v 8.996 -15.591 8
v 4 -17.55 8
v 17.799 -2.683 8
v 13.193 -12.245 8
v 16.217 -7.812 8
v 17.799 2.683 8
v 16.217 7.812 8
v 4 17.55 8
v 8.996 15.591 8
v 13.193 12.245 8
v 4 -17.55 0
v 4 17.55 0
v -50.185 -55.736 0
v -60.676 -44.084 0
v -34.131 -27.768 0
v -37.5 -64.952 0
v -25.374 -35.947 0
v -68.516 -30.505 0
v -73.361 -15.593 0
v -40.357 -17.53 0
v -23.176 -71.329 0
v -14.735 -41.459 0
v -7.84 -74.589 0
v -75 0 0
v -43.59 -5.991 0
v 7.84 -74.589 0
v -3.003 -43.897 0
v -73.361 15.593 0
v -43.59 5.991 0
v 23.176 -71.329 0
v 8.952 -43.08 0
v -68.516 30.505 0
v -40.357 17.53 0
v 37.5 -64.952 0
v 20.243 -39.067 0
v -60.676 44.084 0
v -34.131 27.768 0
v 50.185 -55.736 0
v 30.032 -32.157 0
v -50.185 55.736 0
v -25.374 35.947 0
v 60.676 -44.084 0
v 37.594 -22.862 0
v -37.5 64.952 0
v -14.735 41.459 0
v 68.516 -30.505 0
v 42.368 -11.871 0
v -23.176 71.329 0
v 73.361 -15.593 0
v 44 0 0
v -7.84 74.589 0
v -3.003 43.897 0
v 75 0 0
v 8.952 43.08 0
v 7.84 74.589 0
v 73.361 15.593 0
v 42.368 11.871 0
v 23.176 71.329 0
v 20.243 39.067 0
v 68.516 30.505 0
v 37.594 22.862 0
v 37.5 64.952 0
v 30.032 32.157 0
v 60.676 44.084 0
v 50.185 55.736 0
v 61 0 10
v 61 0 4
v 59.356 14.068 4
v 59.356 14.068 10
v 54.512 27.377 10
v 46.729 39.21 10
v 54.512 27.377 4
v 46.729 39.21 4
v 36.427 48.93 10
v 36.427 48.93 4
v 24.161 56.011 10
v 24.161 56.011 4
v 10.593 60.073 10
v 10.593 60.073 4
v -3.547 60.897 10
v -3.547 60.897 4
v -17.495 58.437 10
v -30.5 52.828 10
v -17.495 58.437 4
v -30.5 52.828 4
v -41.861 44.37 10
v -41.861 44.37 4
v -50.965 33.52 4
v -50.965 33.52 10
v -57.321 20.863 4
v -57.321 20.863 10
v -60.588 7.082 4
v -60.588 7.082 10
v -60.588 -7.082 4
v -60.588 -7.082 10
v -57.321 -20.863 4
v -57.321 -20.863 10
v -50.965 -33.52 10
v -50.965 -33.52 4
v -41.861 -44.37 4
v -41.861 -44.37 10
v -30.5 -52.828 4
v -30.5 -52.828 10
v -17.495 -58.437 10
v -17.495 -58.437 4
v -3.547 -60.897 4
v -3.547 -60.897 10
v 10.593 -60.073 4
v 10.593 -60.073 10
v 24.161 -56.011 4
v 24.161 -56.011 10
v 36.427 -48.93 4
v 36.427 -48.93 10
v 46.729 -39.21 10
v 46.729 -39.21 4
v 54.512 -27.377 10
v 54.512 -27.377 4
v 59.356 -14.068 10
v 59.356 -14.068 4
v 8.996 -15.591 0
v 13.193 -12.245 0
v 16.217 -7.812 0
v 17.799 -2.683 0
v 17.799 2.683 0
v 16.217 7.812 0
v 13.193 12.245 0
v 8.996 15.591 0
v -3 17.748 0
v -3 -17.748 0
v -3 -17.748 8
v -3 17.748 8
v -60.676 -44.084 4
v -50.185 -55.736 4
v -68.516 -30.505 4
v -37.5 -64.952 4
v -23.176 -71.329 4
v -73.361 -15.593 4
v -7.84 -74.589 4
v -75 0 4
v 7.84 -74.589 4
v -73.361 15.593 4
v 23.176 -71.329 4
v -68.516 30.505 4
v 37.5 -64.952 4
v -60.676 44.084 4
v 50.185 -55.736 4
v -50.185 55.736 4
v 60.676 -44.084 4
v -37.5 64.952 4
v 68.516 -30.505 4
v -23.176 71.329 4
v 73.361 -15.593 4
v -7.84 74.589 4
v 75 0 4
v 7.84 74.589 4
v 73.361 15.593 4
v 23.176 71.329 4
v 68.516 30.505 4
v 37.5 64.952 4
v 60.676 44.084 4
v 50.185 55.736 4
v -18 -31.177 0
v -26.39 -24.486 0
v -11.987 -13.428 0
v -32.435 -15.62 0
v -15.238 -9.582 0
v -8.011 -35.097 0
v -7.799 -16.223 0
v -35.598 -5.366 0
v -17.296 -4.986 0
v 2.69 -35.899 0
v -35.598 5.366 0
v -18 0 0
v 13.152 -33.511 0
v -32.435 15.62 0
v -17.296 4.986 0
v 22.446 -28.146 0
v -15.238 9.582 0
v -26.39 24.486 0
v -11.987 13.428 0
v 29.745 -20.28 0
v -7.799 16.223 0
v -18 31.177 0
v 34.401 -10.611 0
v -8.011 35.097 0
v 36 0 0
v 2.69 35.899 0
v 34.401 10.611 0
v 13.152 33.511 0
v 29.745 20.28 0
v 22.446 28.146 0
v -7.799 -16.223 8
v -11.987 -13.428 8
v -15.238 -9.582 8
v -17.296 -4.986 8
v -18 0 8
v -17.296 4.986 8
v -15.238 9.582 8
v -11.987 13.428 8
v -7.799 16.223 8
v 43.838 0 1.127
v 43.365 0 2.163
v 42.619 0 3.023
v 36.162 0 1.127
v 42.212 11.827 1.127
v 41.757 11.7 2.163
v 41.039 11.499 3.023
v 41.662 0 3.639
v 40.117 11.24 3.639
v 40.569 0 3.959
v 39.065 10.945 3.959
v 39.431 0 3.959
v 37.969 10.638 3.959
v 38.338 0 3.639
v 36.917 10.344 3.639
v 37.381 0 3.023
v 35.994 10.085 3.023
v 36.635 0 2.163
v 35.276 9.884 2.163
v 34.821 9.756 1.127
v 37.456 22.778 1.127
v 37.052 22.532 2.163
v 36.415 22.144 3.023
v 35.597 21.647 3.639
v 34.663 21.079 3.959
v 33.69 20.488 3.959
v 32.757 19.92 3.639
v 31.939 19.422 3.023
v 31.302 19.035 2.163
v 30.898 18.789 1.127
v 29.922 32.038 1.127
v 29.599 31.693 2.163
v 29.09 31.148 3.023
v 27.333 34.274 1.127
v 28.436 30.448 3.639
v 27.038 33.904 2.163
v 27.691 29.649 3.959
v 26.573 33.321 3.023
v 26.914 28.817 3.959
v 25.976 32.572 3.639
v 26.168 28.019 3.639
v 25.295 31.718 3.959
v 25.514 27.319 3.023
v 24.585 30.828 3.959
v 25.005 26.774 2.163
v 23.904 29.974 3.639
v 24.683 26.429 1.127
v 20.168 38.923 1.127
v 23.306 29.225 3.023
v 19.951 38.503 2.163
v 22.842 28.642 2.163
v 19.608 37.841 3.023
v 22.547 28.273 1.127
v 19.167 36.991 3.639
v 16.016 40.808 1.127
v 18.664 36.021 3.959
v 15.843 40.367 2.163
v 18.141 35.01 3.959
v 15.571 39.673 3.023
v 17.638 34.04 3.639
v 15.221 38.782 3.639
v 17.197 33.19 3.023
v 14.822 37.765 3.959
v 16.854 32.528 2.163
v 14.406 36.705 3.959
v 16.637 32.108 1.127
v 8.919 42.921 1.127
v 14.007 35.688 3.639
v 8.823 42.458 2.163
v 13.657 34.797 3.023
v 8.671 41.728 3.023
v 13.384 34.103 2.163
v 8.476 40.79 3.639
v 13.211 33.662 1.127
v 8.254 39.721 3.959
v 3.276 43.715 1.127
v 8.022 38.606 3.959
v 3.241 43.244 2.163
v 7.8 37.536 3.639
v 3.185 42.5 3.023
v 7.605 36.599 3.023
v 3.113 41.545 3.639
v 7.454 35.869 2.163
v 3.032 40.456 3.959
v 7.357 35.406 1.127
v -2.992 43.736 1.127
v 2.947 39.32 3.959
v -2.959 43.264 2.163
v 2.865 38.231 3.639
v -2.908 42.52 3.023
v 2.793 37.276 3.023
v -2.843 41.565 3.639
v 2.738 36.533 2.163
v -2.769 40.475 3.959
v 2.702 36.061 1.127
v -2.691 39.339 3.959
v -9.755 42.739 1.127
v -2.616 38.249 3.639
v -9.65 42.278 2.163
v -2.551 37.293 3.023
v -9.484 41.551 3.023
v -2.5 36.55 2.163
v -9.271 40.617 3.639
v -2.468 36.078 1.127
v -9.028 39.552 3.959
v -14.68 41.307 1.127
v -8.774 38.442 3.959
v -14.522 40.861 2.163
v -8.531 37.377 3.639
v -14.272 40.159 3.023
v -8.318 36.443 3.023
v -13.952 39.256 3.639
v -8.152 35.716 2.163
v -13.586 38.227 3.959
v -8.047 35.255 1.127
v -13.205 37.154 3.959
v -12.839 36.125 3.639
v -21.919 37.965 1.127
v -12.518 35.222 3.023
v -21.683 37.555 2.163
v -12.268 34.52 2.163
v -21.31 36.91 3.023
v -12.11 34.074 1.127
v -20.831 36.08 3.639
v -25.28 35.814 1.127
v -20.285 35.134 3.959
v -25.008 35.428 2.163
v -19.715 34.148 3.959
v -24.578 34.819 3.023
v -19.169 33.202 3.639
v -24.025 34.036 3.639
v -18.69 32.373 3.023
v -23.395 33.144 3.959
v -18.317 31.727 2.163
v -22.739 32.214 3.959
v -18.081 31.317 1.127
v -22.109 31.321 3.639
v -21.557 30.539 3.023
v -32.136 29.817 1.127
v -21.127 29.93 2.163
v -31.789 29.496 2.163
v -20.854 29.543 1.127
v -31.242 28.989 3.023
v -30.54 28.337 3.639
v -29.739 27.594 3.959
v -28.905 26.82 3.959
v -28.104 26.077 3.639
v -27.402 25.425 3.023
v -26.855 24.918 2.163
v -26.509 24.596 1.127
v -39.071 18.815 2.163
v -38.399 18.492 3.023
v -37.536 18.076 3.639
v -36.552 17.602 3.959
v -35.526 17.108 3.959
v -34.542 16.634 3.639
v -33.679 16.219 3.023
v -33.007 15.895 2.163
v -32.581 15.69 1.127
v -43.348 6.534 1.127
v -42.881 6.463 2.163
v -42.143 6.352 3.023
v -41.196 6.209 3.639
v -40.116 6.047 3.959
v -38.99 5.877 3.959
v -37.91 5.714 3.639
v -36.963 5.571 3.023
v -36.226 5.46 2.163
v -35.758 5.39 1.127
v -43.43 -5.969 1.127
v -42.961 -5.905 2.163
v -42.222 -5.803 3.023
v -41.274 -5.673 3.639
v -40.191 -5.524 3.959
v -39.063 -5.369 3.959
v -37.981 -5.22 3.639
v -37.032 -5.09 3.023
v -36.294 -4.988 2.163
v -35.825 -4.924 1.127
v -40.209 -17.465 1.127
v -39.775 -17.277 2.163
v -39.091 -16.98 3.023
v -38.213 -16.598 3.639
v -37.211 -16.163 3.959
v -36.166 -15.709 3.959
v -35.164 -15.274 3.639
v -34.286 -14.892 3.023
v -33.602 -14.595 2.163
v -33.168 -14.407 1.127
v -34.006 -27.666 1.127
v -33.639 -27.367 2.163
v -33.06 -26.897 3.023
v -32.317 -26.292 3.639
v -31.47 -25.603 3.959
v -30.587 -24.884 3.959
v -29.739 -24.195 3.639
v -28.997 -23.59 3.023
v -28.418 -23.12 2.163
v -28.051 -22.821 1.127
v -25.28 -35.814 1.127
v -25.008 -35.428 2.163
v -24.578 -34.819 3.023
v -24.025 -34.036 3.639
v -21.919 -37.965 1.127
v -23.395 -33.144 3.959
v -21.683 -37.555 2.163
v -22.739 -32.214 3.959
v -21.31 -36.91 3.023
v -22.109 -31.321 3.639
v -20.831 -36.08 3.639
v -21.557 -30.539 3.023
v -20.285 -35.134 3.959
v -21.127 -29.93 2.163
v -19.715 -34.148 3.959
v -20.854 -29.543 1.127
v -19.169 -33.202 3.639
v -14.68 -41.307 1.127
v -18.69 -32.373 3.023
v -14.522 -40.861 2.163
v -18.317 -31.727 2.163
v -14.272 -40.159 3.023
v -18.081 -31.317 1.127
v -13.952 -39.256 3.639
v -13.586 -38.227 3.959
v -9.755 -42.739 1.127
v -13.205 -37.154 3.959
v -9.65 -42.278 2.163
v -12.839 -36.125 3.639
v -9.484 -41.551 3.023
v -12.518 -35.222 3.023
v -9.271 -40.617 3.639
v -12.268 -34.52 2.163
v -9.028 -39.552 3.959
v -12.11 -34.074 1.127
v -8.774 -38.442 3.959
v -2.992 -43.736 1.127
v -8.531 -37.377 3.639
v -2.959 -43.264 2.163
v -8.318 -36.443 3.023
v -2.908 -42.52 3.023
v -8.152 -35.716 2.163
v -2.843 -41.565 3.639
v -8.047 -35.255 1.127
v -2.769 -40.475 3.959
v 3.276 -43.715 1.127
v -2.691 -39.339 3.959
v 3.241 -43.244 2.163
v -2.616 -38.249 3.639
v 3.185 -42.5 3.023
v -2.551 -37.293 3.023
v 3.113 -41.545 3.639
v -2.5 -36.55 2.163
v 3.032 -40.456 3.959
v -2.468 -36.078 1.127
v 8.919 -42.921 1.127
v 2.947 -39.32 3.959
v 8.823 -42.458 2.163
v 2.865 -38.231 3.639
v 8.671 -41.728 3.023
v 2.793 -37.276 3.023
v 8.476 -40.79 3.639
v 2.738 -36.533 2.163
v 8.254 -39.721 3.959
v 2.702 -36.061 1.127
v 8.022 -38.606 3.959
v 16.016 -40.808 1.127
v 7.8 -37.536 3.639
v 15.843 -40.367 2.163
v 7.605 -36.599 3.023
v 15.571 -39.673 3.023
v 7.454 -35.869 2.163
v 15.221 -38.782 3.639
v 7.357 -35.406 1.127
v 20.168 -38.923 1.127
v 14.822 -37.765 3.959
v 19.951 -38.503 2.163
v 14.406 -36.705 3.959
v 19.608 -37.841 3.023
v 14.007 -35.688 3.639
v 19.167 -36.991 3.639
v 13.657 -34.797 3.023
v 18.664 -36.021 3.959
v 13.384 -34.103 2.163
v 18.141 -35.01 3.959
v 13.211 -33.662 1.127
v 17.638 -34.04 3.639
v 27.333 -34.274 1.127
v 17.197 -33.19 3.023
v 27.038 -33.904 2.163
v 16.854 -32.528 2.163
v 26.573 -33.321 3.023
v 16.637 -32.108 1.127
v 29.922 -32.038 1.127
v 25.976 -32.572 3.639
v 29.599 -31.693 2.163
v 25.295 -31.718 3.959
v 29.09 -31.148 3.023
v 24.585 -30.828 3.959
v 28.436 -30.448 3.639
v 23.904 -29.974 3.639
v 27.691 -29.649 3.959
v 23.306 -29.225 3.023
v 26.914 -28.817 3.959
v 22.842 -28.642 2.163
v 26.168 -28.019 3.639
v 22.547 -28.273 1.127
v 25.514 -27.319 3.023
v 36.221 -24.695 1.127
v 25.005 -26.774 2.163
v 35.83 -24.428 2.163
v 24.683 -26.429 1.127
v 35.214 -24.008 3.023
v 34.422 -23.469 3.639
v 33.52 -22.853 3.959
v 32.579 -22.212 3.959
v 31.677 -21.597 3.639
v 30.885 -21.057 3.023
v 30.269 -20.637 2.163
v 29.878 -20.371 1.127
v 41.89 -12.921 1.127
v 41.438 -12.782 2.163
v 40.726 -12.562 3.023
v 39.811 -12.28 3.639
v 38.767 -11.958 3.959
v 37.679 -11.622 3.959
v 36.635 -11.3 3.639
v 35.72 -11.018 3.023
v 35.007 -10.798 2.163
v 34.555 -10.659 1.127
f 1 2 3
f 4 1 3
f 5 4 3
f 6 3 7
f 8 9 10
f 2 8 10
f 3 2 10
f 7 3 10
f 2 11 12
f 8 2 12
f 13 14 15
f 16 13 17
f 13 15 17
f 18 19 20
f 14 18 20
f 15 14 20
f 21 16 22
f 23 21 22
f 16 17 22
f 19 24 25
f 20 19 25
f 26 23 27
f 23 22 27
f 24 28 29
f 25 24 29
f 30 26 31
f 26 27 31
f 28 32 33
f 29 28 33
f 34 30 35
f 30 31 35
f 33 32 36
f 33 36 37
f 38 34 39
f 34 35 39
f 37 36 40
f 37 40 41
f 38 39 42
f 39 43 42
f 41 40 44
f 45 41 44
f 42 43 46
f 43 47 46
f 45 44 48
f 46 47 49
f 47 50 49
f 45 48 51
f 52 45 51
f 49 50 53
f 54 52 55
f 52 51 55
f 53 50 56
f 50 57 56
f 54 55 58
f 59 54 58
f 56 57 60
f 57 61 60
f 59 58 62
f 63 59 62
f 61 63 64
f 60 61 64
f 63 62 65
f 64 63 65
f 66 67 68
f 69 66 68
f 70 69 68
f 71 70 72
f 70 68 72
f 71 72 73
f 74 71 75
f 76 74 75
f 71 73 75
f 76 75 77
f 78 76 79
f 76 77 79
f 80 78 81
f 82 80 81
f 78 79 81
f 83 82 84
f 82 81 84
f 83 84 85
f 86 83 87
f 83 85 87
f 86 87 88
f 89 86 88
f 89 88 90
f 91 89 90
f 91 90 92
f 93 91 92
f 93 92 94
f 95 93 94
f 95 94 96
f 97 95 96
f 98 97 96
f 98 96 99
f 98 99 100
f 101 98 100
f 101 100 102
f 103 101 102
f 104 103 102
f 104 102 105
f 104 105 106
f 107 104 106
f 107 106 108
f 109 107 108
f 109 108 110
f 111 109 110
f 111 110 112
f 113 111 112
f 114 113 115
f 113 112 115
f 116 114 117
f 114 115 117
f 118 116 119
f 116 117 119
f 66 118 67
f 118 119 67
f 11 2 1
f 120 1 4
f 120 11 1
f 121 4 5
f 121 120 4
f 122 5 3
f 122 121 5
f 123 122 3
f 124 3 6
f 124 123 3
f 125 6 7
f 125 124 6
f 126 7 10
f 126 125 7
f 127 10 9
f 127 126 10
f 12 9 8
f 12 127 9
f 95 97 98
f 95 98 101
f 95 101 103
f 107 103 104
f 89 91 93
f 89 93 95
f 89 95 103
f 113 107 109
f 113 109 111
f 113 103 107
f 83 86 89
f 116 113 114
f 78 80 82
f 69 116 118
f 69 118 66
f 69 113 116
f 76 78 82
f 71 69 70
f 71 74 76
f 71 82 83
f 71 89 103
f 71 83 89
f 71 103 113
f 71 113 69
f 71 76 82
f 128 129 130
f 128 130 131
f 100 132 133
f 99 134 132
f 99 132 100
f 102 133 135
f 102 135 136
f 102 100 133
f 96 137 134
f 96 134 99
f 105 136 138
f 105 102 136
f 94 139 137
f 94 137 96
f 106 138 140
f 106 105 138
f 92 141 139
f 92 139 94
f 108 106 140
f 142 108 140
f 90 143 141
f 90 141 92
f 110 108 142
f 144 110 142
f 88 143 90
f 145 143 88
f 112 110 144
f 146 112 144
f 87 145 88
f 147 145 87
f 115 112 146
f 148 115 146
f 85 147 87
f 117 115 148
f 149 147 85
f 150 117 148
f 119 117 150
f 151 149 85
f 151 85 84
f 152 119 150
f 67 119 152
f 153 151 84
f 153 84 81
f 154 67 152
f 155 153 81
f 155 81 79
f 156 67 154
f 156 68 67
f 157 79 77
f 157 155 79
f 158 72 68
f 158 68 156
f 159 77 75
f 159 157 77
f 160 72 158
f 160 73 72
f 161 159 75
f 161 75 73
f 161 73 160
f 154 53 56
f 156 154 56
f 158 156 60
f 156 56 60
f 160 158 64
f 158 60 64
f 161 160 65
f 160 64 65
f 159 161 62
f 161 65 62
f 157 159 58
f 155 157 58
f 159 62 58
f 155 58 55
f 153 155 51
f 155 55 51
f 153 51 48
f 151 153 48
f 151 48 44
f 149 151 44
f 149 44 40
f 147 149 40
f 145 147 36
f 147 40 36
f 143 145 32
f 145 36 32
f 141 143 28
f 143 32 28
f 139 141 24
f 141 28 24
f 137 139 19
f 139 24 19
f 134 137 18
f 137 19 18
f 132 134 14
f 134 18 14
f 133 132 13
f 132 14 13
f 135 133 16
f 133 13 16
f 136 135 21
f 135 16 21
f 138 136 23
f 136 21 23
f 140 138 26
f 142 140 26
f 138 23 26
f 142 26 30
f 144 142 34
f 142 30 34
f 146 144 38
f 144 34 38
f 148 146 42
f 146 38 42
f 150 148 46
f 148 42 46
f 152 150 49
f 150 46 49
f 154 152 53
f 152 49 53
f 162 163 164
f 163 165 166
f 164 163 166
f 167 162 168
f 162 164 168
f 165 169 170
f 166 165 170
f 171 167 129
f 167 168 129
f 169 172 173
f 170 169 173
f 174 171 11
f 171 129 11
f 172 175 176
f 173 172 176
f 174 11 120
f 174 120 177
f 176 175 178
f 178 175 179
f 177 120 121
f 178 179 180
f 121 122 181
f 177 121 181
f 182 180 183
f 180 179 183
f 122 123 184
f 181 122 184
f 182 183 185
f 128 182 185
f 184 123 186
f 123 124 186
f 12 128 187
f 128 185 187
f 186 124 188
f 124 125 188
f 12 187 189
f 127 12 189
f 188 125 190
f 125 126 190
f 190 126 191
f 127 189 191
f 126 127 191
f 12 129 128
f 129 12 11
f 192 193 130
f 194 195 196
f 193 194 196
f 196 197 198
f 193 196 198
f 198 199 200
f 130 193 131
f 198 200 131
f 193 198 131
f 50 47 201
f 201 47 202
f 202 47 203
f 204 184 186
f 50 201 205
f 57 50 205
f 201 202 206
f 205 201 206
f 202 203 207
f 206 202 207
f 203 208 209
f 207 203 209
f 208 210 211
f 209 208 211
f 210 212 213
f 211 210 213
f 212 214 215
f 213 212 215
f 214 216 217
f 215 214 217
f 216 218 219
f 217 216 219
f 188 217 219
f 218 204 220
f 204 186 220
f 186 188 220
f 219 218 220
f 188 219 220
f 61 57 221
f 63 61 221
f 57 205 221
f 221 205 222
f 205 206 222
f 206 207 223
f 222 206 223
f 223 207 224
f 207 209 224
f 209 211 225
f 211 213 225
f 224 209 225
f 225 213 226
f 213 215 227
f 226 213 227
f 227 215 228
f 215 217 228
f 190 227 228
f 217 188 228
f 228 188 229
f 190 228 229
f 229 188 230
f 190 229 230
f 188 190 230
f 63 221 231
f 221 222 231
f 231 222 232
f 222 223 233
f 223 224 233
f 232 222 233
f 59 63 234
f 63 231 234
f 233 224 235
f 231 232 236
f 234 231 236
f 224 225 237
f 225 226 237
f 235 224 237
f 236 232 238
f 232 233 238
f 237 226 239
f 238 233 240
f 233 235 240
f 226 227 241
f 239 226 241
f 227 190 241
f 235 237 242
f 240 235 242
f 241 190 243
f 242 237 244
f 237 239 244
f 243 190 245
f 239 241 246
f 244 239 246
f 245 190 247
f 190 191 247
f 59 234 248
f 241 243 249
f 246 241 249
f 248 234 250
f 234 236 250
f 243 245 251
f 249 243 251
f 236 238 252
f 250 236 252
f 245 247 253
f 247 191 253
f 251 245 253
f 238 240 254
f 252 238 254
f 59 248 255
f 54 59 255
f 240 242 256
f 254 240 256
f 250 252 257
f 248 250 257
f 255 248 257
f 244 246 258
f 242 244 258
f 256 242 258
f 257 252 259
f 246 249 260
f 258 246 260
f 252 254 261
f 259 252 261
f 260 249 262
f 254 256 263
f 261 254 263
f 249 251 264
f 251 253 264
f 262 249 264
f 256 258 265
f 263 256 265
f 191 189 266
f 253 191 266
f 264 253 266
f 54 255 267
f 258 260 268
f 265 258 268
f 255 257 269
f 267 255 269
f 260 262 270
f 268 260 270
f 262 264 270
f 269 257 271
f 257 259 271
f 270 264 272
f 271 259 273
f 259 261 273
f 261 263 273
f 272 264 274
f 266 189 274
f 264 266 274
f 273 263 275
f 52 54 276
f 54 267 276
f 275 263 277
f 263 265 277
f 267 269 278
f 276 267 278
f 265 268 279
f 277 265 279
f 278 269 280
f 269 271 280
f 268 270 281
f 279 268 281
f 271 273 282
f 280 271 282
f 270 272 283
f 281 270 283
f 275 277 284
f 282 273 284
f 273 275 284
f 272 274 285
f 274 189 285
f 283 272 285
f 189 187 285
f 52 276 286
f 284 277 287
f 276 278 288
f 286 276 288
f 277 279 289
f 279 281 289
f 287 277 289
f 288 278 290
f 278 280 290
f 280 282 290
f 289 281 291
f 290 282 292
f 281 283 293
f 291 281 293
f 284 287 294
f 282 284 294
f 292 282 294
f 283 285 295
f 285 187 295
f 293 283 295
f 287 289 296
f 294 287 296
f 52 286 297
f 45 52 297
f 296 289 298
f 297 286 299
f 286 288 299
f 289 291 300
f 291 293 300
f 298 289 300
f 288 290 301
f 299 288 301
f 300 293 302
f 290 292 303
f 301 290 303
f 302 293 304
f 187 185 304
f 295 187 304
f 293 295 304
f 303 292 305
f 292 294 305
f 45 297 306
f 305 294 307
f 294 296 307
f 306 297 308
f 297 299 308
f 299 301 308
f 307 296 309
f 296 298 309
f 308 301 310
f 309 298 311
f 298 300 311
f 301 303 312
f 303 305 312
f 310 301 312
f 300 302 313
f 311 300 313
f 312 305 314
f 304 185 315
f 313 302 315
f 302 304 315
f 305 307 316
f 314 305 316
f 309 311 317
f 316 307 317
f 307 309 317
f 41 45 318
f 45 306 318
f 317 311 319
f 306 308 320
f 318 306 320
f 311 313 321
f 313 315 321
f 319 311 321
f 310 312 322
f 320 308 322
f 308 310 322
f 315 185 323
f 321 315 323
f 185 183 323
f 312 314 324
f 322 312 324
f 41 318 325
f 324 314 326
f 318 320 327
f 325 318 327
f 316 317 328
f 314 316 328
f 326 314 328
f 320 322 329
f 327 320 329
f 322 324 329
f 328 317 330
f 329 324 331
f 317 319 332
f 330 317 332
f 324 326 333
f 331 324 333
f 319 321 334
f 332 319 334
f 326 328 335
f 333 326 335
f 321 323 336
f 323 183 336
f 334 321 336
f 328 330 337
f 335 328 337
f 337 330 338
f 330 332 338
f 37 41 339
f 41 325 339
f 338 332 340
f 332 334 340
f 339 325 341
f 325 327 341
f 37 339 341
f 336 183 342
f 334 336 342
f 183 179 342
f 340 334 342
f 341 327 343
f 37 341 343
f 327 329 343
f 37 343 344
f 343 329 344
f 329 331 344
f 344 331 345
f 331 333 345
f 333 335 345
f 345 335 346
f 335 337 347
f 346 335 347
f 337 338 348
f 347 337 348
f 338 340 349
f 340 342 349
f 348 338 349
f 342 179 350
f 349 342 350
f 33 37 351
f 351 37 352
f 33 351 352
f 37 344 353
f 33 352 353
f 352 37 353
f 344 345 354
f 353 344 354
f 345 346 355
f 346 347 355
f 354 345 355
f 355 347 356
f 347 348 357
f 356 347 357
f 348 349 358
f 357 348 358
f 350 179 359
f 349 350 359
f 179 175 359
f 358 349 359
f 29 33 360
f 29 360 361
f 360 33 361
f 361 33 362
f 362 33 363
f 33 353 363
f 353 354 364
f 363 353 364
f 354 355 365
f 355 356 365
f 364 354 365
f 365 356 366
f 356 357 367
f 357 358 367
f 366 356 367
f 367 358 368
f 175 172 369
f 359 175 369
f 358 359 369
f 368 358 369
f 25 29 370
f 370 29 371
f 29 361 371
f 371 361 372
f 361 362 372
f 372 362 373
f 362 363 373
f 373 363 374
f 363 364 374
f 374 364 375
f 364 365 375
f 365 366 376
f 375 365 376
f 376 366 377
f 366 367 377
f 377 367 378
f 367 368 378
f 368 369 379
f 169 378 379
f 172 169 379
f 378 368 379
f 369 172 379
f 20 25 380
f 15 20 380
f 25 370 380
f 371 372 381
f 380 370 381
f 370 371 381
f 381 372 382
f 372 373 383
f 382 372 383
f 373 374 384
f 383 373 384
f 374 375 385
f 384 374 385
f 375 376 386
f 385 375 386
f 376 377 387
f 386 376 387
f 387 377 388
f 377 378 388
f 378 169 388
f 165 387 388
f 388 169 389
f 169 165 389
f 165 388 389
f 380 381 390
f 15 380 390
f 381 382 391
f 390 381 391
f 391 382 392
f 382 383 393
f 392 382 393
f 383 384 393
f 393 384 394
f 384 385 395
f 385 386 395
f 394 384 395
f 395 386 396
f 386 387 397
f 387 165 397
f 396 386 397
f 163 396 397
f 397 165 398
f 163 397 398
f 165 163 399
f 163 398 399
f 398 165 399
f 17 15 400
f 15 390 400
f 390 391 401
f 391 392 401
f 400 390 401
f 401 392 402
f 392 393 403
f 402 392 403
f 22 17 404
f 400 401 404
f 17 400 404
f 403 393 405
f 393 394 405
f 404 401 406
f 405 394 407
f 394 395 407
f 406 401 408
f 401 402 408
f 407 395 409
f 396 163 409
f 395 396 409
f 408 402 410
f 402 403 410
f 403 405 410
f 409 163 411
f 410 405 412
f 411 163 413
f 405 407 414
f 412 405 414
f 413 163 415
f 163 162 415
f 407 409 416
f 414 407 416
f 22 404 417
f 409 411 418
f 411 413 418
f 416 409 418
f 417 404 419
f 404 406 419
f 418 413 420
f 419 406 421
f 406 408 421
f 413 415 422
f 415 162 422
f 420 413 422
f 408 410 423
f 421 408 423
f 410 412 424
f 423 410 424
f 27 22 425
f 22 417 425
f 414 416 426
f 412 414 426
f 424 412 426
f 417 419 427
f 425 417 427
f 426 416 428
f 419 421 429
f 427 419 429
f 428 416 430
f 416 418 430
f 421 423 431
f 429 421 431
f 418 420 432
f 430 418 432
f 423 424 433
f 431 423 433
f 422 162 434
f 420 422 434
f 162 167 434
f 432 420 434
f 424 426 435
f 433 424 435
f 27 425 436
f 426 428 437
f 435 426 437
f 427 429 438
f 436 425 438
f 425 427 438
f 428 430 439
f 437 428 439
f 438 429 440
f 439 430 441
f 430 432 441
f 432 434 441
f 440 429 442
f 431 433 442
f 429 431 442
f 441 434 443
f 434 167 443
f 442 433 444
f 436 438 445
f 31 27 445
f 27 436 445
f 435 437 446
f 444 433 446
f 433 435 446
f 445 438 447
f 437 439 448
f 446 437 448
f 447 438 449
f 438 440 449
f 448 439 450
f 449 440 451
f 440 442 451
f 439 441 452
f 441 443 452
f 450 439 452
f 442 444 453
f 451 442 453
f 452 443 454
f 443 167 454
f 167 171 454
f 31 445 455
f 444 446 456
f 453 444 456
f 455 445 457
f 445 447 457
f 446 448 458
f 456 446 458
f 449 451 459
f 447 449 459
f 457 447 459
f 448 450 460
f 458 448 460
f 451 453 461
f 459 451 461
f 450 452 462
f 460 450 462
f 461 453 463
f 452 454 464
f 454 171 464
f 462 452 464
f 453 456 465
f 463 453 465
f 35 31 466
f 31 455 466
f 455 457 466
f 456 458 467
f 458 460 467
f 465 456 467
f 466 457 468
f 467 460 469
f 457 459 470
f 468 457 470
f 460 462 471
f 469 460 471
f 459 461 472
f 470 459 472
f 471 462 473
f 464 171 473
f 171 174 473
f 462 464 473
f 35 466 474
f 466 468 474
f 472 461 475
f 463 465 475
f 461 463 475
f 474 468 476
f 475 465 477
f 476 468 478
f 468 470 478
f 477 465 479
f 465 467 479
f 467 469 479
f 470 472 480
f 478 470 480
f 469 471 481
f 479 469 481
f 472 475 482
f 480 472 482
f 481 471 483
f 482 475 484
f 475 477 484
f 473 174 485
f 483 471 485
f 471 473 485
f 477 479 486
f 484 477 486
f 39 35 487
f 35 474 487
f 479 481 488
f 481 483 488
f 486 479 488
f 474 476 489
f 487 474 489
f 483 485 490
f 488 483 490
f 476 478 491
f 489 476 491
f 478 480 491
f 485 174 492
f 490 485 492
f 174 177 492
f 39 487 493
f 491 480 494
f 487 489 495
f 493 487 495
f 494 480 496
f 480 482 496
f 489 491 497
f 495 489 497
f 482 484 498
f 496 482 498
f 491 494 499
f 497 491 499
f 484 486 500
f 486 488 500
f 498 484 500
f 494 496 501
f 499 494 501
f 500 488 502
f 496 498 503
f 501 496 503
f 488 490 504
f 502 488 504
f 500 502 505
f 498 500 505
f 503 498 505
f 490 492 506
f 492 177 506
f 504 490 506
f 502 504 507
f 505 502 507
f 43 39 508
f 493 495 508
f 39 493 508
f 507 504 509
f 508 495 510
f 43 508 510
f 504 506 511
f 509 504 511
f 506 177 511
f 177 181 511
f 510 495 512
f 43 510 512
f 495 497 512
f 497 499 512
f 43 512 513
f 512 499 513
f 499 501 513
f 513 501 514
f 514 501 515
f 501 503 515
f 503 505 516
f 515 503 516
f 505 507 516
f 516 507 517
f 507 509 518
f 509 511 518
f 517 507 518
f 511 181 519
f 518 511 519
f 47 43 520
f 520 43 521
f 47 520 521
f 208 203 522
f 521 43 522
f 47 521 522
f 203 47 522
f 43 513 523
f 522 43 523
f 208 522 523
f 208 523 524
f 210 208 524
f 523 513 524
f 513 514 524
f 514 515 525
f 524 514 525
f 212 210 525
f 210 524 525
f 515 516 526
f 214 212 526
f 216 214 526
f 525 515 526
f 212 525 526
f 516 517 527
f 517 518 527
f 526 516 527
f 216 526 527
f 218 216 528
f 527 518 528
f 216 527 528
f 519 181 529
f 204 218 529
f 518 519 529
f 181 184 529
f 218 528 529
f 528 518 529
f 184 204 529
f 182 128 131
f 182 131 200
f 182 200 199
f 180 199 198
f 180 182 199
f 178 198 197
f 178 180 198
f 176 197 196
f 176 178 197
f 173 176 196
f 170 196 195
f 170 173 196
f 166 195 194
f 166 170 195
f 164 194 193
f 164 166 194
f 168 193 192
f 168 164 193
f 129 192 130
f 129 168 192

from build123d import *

# Parameters (mm, degrees)
TORUS_R           = 4
CYLINDER003_R     = 18
CYLINDER003_DEPTH = 2
BOX_W             = 7
BOX_H             = 41
BOX_DEPTH         = 10
CYLINDER002_R     = 18
CYLINDER002_DEPTH = 10
CYLINDER001_R     = 75
CYLINDER001_DEPTH = 4
CYLINDER_R        = 61
CYLINDER_DEPTH    = 10


with BuildPart() as torus:
    # Torus → Torus (revolve)
    with BuildSketch(Plane.XZ):
        with Locations((40, 0)):
            Circle(TORUS_R)
    revolve(axis=Axis((0, 0, 0), (0, 0, 1)))


with BuildPart() as cylinder003:
    # Cylinder003 → Cylinder003 (new body)
    with BuildSketch(Plane.XY.offset(8)):
        Circle(CYLINDER003_R)
    extrude(amount=CYLINDER003_DEPTH)


with BuildPart() as box:
    # Box → Box (new body)
    with BuildSketch(Plane(origin=(-3, -20, 0), x_dir=(1, 0, 0), z_dir=(0, 0, 1))):
        with Locations((3.5, 20.5)):
            Rectangle(BOX_W, BOX_H)
    extrude(amount=BOX_DEPTH)


with BuildPart() as cylinder002:
    # Cylinder002 → Cylinder002 (new body)
    with BuildSketch(Plane.XY):
        Circle(CYLINDER002_R)
    extrude(amount=CYLINDER002_DEPTH)


with BuildPart() as cylinder001:
    # Cylinder001 → Cylinder001 (new body)
    with BuildSketch(Plane.XY):
        Circle(CYLINDER001_R)
    extrude(amount=CYLINDER001_DEPTH)


with BuildPart() as cut001:
    # Cylinder → Cylinder (new body)
    with BuildSketch(Plane.XY):
        Circle(CYLINDER_R)
    extrude(amount=CYLINDER_DEPTH)

    # Fusion: union Cylinder001
    add(cylinder001.part)

    # Cut: cut Cylinder002
    add(cylinder002.part, mode=Mode.SUBTRACT)

    # Fusion001: union Box
    add(box.part)

    # Fusion002: union Cylinder003
    add(cylinder003.part)

    # Cut001: cut Torus
    add(torus.part, mode=Mode.SUBTRACT)


solid = cut001.part
